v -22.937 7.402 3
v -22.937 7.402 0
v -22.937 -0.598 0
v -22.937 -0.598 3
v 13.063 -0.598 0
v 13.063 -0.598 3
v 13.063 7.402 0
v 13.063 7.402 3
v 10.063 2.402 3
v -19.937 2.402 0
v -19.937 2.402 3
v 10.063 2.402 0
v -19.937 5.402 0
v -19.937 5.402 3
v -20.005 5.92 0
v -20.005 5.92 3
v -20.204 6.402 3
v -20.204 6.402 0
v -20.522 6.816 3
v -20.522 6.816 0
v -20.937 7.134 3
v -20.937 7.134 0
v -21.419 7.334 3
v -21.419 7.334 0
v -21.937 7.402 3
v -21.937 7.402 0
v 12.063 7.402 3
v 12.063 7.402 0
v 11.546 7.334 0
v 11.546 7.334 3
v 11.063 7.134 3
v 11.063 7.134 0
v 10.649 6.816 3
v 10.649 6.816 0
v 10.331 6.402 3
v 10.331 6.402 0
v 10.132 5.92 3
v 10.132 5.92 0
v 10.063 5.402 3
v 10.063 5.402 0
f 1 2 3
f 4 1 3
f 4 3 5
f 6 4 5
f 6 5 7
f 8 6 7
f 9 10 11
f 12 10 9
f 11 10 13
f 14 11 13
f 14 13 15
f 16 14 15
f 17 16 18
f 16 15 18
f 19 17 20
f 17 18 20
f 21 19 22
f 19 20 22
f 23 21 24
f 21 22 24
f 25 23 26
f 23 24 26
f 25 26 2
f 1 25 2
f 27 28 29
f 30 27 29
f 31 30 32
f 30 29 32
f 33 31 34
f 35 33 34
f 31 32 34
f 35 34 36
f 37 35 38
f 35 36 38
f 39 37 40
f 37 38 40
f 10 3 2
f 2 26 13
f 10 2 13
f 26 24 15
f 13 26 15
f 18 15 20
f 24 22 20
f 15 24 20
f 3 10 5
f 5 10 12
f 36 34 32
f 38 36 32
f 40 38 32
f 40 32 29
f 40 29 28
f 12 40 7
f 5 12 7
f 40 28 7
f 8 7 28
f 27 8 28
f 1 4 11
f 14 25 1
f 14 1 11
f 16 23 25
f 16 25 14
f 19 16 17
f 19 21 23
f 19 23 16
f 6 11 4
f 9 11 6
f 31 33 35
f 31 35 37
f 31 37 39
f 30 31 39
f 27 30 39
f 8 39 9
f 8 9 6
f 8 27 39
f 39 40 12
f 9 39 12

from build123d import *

# Parameters (mm, degrees)
F0_W     = 30
F0_H     = 3
F1_DEPTH = 3


with BuildPart() as f1:
    # F0 (on Top) → F1 (new body)
    with BuildSketch(Plane.XY):
        with Locations((-4.936537, 0.902144)):
            Rectangle(F0_W, F0_H)
        with BuildLine():
            Line((10.063463, 2.402144), (10.063463, -0.597856))
            Line((10.063463, -0.597856), (13.063463, -0.597856))
            Line((13.063463, -0.597856), (13.063463, 7.402144))
            Line((13.063463, 7.402144), (12.063463, 7.402144))
            ThreePointArc((12.063463, 7.402144), (10.649249, 6.816358), (10.063463, 5.402144))
            Line((10.063463, 5.402144), (10.063463, 2.402144))
        make_face()
        with BuildLine():
            Line((-22.936537, -0.597856), (-19.936537, -0.597856))
            Line((-19.936537, -0.597856), (-19.936537, 2.402144))
            Line((-19.936537, 2.402144), (-19.936537, 5.402144))
            ThreePointArc((-19.936537, 5.402144), (-20.522324, 6.816358), (-21.936537, 7.402144))
            Line((-21.936537, 7.402144), (-22.936537, 7.402144))
            Line((-22.936537, 7.402144), (-22.936537, -0.597856))
        make_face()
    extrude(amount=F1_DEPTH)


solid = f1.part
